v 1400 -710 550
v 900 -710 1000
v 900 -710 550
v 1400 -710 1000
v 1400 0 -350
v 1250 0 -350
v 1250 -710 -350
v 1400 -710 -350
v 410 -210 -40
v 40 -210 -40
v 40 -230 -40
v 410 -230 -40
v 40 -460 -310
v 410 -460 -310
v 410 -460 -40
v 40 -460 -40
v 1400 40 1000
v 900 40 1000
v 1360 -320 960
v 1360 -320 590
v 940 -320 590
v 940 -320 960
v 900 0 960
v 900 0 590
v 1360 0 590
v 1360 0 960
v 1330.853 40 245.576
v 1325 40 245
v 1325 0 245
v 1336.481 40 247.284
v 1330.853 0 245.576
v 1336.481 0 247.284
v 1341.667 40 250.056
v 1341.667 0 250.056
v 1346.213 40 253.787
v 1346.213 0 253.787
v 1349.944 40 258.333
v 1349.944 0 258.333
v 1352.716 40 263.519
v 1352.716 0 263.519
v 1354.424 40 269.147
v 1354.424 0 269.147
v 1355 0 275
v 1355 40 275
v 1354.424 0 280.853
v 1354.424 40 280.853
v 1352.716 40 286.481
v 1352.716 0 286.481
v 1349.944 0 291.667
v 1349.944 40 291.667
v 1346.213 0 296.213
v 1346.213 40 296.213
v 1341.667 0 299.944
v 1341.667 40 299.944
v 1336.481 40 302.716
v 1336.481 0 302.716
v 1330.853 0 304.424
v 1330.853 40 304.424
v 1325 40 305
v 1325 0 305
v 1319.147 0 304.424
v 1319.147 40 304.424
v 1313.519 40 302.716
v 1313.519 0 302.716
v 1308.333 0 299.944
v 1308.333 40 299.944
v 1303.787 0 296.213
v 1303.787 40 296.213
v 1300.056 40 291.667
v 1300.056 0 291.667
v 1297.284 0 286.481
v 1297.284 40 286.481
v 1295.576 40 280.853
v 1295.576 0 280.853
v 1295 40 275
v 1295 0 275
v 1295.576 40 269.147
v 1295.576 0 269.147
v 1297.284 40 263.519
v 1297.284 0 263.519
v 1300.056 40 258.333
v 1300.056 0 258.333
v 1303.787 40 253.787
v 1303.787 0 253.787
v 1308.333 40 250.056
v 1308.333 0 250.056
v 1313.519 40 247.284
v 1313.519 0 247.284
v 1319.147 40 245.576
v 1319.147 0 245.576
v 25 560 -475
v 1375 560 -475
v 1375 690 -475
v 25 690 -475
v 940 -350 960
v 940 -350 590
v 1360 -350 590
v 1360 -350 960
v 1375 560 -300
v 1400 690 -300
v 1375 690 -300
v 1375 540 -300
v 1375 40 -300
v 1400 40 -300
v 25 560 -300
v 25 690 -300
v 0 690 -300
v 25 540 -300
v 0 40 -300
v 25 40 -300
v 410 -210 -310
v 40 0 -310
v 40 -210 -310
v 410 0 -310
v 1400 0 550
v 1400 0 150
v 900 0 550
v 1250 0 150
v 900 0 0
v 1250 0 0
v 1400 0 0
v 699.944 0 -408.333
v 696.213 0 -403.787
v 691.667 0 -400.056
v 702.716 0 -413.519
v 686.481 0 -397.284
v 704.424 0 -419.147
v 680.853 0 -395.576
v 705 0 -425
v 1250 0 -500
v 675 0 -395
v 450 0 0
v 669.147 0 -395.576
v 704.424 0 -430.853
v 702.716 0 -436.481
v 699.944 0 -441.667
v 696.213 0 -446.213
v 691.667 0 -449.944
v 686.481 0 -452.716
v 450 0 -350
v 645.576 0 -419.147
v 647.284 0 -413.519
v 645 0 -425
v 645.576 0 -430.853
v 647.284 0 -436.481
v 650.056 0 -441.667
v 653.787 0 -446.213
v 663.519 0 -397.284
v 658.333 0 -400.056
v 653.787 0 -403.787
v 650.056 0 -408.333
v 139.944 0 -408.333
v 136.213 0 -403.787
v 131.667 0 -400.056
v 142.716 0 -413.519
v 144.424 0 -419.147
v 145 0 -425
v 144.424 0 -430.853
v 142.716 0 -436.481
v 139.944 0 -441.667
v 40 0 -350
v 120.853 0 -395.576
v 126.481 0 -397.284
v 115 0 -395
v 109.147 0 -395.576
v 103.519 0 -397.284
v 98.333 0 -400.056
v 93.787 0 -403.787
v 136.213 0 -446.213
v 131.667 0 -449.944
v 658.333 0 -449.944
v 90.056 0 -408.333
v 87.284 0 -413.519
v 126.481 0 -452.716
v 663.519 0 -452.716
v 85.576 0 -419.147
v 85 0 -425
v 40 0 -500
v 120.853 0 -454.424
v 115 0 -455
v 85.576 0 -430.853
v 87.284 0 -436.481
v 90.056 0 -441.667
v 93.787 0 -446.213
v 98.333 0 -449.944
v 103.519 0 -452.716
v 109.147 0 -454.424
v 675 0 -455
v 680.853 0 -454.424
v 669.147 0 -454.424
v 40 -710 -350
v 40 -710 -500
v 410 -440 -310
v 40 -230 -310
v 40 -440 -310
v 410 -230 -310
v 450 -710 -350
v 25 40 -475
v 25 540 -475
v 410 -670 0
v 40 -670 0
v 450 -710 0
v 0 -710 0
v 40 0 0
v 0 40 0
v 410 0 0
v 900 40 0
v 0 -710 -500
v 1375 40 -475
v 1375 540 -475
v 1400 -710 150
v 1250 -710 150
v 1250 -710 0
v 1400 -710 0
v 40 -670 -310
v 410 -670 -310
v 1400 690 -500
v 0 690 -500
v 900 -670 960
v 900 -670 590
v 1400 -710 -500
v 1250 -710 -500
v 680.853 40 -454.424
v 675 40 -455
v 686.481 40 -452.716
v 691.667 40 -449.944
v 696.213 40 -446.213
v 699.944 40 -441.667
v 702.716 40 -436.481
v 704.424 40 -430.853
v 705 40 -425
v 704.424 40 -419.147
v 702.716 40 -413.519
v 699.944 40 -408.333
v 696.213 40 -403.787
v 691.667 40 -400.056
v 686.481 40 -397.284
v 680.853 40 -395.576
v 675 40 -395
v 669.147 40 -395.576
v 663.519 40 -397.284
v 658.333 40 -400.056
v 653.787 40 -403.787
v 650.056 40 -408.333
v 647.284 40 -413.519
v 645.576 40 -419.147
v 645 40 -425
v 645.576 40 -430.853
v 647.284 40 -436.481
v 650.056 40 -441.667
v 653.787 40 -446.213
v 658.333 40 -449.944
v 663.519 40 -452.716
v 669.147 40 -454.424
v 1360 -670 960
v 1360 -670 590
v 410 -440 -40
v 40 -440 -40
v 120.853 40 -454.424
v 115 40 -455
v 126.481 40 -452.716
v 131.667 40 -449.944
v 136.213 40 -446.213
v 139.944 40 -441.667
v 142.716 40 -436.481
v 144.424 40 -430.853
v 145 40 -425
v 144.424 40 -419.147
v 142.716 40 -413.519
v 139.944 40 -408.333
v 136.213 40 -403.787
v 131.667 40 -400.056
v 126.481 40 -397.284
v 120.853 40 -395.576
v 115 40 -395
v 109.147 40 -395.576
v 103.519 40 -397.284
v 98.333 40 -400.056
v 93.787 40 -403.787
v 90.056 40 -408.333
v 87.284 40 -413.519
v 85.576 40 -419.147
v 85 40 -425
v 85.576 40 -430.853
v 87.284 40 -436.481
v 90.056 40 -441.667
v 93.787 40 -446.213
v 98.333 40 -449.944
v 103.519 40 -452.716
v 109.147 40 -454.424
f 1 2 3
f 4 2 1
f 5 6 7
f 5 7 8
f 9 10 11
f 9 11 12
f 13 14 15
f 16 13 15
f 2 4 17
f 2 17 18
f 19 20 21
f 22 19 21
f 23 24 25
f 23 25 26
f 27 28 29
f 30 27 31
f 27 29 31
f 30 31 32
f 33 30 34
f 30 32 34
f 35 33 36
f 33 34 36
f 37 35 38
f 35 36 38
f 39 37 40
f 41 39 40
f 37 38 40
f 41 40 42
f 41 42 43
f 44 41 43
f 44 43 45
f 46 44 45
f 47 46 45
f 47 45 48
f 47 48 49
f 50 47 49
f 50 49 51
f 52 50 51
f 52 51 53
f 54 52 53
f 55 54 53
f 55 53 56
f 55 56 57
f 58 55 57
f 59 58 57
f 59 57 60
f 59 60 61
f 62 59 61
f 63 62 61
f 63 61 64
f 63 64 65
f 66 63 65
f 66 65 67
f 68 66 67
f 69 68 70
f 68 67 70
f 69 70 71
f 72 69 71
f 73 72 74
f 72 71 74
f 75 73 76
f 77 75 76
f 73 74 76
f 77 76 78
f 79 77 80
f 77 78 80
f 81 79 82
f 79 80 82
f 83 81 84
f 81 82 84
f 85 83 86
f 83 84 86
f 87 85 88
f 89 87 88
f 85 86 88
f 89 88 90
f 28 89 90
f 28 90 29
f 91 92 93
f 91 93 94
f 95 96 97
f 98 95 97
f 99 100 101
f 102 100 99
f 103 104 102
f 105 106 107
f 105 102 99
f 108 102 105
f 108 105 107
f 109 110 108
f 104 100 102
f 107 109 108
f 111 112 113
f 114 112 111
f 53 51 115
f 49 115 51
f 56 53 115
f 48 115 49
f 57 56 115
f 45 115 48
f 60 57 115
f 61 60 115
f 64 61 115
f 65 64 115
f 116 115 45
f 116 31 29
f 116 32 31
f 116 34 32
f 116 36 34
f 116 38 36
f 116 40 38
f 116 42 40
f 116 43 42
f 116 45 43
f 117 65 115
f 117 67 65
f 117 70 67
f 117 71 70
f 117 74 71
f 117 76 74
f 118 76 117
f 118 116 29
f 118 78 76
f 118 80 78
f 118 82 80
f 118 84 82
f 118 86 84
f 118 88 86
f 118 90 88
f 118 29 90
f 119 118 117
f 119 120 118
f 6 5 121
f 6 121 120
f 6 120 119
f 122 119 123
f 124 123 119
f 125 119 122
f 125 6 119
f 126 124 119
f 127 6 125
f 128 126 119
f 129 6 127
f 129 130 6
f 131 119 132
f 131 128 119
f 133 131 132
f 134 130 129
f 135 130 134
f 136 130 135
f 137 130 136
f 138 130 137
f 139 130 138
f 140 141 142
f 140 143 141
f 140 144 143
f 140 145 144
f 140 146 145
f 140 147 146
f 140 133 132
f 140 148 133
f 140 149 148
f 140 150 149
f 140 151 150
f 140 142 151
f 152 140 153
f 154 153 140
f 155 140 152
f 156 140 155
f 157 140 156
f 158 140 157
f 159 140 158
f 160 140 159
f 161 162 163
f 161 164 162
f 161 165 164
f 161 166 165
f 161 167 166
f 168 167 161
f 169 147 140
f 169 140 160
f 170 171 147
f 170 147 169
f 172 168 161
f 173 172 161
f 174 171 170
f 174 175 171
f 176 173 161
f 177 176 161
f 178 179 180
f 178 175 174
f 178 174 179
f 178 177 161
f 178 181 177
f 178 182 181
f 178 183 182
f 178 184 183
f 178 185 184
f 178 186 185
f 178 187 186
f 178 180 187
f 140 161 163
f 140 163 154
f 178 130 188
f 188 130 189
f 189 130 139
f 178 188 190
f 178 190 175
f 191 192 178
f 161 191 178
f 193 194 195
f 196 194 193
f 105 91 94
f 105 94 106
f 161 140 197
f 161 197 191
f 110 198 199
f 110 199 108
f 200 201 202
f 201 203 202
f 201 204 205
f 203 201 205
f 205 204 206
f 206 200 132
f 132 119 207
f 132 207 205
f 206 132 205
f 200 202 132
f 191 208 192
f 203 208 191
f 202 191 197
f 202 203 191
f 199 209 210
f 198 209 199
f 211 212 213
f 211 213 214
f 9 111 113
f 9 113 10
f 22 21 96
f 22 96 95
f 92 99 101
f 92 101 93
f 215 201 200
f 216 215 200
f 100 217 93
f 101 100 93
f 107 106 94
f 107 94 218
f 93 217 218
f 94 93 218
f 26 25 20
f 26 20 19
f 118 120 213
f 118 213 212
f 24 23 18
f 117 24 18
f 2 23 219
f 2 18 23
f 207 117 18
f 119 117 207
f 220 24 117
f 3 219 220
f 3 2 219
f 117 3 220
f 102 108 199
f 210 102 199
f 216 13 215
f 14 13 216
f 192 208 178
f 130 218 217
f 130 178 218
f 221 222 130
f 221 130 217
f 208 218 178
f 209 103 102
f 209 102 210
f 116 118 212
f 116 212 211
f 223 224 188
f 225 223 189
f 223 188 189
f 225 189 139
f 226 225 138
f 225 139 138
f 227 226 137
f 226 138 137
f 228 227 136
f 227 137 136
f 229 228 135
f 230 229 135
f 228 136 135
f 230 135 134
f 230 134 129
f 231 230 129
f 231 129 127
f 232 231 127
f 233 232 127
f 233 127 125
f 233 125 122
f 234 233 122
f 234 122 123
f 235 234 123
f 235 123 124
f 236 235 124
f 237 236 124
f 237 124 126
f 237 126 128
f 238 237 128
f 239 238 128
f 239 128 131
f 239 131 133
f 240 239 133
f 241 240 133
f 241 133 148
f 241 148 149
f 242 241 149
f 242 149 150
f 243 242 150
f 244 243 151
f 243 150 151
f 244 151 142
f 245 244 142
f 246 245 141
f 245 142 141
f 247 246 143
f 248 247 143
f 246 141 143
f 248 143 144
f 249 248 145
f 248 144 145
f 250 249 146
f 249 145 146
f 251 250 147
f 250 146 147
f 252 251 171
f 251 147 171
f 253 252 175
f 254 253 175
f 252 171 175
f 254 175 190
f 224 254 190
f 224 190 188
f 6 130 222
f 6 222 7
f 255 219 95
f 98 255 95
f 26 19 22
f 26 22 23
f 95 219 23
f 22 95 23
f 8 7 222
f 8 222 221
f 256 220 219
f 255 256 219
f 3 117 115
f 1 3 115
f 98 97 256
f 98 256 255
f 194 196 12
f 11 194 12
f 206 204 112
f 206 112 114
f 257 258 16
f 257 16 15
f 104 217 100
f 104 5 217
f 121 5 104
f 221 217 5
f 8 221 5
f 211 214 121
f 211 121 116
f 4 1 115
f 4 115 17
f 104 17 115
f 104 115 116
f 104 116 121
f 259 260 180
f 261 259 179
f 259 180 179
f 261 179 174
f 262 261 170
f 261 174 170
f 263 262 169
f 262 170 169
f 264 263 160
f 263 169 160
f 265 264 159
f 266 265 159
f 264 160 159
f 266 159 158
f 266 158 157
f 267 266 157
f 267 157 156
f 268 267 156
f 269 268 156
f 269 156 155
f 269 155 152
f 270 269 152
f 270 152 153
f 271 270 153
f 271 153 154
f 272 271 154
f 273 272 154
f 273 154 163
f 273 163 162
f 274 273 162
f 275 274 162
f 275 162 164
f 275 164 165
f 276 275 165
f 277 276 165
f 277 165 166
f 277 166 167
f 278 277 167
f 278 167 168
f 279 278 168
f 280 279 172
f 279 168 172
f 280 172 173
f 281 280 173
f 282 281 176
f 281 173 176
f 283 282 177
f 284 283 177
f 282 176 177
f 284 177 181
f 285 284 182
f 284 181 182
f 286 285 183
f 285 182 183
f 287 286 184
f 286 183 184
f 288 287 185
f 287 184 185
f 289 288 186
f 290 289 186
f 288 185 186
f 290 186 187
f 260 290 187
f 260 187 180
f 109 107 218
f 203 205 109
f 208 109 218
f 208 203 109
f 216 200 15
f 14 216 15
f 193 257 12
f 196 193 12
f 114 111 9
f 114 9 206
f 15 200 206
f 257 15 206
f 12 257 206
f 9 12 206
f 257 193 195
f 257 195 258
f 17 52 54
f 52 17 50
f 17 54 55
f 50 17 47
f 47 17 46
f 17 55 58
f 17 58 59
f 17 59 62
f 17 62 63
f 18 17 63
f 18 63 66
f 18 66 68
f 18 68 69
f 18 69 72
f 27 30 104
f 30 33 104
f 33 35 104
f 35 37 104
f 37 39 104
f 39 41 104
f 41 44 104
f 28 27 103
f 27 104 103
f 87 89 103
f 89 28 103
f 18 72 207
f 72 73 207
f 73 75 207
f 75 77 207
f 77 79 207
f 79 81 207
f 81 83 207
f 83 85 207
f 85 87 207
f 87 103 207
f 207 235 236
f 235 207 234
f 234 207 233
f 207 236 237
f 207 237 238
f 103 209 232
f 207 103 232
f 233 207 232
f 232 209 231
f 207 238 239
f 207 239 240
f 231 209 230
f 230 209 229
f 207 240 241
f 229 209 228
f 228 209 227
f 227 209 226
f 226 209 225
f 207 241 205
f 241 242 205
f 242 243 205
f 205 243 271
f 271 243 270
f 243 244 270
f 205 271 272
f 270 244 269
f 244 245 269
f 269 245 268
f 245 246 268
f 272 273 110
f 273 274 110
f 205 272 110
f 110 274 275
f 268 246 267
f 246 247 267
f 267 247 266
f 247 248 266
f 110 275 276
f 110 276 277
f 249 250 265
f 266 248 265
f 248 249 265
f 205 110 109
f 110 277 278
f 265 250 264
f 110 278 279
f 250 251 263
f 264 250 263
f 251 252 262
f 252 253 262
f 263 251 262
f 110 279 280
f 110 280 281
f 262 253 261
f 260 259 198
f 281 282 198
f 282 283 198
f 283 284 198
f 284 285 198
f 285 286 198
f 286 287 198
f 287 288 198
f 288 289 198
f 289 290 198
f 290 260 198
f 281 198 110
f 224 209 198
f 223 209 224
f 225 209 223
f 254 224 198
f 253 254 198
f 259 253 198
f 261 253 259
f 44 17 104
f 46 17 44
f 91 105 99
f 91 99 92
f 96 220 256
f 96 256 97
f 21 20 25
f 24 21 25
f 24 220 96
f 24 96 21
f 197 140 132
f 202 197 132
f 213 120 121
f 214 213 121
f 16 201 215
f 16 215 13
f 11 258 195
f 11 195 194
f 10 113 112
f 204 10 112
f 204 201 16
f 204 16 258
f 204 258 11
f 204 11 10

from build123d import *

# Parameters (mm, degrees)
BOSS_EXTRUDE1_DEPTH = 40
SKETCH3_W           = 450
SKETCH3_H           = 500
SKETCH3_W_2         = 500
SKETCH3_H_2         = 450
BOSS_EXTRUDE2_DEPTH = 710
SKETCH5_W           = 410
SKETCH5_H           = 710
CUT_EXTRUDE1_DEPTH  = 150
SKETCH7_R           = 30
CUT_EXTRUDE2_DEPTH  = 150
SKETCH8_W           = 370
SKETCH8_H           = 670
CUT_EXTRUDE3_DEPTH  = 310
SKETCH9_W           = 370
SKETCH9_H           = 670
CUT_EXTRUDE4_DEPTH  = 460
SKETCH10_W          = 150
SKETCH10_H          = 150
BOSS_EXTRUDE3_DEPTH = 710
SKETCH11_W          = 310
SKETCH11_H          = 20
BOSS_EXTRUDE4_DEPTH = 410
SKETCH12_W          = 370
SKETCH12_H          = 670
CUT_EXTRUDE5_DEPTH  = 40
BOSS_EXTRUDE5_DEPTH = 370
SKETCH14_W          = 370
SKETCH14_H          = 670
CUT_EXTRUDE10_DEPTH = 40
BOSS_EXTRUDE6_DEPTH = 650
SKETCH17_W          = 175
SKETCH17_H          = 20
BOSS_EXTRUDE7_DEPTH = 1350


with BuildPart() as part:
    # Sketch2 → Boss-Extrude1 (new body)
    with BuildSketch(Plane(origin=(0, 0, 0), x_dir=(1, 0, 0), z_dir=(0, 1, 0))):
        Polygon((0, 500), (1400, 500), (900, 0), (0, 0), align=None)
        Polygon((900, 0), (1400, 500), (1400, 0), (1400, -1000), (900, -1000), align=None)
    extrude(amount=BOSS_EXTRUDE1_DEPTH)

    # Sketch3 → Boss-Extrude2 (add)
    with BuildSketch(Plane.XZ):
        with Locations((225, -250)):
            Rectangle(SKETCH3_W, SKETCH3_H)
        with Locations((1150, 775)):
            Rectangle(SKETCH3_W_2, SKETCH3_H_2)
    extrude(amount=BOSS_EXTRUDE2_DEPTH)

    # Sketch5 → Cut-Extrude1 (cut)
    with BuildSketch(Plane(origin=(0, 0, -500), x_dir=(-1, 0, 0), z_dir=(0, 0, -1))):
        with Locations((-245, -355)):
            Rectangle(SKETCH5_W, SKETCH5_H)
    extrude(amount=-CUT_EXTRUDE1_DEPTH, mode=Mode.SUBTRACT)

    # Sketch7 → Cut-Extrude2 (cut)
    with BuildSketch(Plane.XZ):
        with Locations(Location((115, -425, 0), (0, 0, 270))):
            Circle(SKETCH7_R)
        with Locations(Location((675, -425, 0), (0, 0, 270))):
            Circle(SKETCH7_R)
        with Locations(Location((1325, 275, 0), (0, 0, 270))):
            Circle(SKETCH7_R)
    extrude(amount=-CUT_EXTRUDE2_DEPTH, mode=Mode.SUBTRACT)

    # Sketch8 → Cut-Extrude3 (cut)
    with BuildSketch(Plane.XY):
        with Locations((225, -335)):
            Rectangle(SKETCH8_W, SKETCH8_H)
    extrude(amount=-CUT_EXTRUDE3_DEPTH, mode=Mode.SUBTRACT)

    # Sketch9 → Cut-Extrude4 (cut)
    with BuildSketch(Plane.ZY.offset(-900)):
        with Locations((775, -335)):
            Rectangle(SKETCH9_W, SKETCH9_H)
    extrude(amount=-CUT_EXTRUDE4_DEPTH, mode=Mode.SUBTRACT)

    # Sketch10 → Boss-Extrude3 (add)
    with BuildSketch(Plane.XZ):
        with Locations((1325, 75)):
            Rectangle(SKETCH10_W, SKETCH10_H)
        with Locations((1325, -425)):
            Rectangle(SKETCH10_W, SKETCH10_H)
    extrude(amount=BOSS_EXTRUDE3_DEPTH)

    # Sketch11 → Boss-Extrude4 (add)
    with BuildSketch(Plane.ZY.offset(-410)):
        with Locations((-155, -220)):
            Rectangle(SKETCH11_W, SKETCH11_H)
        with Locations((-155, -450)):
            Rectangle(SKETCH11_W, SKETCH11_H)
    extrude(amount=BOSS_EXTRUDE4_DEPTH)

    # Sketch12 → Cut-Extrude5 (cut)
    with BuildSketch(Plane.XY):
        with Locations((225, -335)):
            Rectangle(SKETCH12_W, SKETCH12_H)
    extrude(amount=-CUT_EXTRUDE5_DEPTH, mode=Mode.SUBTRACT)

    # Sketch13 → Boss-Extrude5 (add)
    with BuildSketch(Plane.XY.offset(590)):
        Polygon((1360, -320), (900, -320), (900, -335), (900, -350), (1360, -350), align=None)
    extrude(amount=BOSS_EXTRUDE5_DEPTH)

    # Sketch14 → Cut-Extrude10 (cut)
    with BuildSketch(Plane.ZY.offset(-900)):
        with Locations((775, -335)):
            Rectangle(SKETCH14_W, SKETCH14_H)
    extrude(amount=-CUT_EXTRUDE10_DEPTH, mode=Mode.SUBTRACT)

    # Sketch16 → Boss-Extrude6 (add)
    with BuildSketch(Plane(origin=(0, 40, 0), x_dir=(1, 0, 0), z_dir=(0, 1, 0))):
        Polygon((0, 500), (1400, 500), (1400, 300), (1375, 300), (1375, 475), (25, 475), (25, 300), (0, 300), align=None)
    extrude(amount=BOSS_EXTRUDE6_DEPTH)

    # Sketch17 → Boss-Extrude7 (add)
    with BuildSketch(Plane(origin=(25, 0, 0), x_dir=(0, 0, -1), z_dir=(1, 0, 0))):
        with Locations((387.5, 550)):
            Rectangle(SKETCH17_W, SKETCH17_H)
    extrude(amount=BOSS_EXTRUDE7_DEPTH)


solid = part.part
